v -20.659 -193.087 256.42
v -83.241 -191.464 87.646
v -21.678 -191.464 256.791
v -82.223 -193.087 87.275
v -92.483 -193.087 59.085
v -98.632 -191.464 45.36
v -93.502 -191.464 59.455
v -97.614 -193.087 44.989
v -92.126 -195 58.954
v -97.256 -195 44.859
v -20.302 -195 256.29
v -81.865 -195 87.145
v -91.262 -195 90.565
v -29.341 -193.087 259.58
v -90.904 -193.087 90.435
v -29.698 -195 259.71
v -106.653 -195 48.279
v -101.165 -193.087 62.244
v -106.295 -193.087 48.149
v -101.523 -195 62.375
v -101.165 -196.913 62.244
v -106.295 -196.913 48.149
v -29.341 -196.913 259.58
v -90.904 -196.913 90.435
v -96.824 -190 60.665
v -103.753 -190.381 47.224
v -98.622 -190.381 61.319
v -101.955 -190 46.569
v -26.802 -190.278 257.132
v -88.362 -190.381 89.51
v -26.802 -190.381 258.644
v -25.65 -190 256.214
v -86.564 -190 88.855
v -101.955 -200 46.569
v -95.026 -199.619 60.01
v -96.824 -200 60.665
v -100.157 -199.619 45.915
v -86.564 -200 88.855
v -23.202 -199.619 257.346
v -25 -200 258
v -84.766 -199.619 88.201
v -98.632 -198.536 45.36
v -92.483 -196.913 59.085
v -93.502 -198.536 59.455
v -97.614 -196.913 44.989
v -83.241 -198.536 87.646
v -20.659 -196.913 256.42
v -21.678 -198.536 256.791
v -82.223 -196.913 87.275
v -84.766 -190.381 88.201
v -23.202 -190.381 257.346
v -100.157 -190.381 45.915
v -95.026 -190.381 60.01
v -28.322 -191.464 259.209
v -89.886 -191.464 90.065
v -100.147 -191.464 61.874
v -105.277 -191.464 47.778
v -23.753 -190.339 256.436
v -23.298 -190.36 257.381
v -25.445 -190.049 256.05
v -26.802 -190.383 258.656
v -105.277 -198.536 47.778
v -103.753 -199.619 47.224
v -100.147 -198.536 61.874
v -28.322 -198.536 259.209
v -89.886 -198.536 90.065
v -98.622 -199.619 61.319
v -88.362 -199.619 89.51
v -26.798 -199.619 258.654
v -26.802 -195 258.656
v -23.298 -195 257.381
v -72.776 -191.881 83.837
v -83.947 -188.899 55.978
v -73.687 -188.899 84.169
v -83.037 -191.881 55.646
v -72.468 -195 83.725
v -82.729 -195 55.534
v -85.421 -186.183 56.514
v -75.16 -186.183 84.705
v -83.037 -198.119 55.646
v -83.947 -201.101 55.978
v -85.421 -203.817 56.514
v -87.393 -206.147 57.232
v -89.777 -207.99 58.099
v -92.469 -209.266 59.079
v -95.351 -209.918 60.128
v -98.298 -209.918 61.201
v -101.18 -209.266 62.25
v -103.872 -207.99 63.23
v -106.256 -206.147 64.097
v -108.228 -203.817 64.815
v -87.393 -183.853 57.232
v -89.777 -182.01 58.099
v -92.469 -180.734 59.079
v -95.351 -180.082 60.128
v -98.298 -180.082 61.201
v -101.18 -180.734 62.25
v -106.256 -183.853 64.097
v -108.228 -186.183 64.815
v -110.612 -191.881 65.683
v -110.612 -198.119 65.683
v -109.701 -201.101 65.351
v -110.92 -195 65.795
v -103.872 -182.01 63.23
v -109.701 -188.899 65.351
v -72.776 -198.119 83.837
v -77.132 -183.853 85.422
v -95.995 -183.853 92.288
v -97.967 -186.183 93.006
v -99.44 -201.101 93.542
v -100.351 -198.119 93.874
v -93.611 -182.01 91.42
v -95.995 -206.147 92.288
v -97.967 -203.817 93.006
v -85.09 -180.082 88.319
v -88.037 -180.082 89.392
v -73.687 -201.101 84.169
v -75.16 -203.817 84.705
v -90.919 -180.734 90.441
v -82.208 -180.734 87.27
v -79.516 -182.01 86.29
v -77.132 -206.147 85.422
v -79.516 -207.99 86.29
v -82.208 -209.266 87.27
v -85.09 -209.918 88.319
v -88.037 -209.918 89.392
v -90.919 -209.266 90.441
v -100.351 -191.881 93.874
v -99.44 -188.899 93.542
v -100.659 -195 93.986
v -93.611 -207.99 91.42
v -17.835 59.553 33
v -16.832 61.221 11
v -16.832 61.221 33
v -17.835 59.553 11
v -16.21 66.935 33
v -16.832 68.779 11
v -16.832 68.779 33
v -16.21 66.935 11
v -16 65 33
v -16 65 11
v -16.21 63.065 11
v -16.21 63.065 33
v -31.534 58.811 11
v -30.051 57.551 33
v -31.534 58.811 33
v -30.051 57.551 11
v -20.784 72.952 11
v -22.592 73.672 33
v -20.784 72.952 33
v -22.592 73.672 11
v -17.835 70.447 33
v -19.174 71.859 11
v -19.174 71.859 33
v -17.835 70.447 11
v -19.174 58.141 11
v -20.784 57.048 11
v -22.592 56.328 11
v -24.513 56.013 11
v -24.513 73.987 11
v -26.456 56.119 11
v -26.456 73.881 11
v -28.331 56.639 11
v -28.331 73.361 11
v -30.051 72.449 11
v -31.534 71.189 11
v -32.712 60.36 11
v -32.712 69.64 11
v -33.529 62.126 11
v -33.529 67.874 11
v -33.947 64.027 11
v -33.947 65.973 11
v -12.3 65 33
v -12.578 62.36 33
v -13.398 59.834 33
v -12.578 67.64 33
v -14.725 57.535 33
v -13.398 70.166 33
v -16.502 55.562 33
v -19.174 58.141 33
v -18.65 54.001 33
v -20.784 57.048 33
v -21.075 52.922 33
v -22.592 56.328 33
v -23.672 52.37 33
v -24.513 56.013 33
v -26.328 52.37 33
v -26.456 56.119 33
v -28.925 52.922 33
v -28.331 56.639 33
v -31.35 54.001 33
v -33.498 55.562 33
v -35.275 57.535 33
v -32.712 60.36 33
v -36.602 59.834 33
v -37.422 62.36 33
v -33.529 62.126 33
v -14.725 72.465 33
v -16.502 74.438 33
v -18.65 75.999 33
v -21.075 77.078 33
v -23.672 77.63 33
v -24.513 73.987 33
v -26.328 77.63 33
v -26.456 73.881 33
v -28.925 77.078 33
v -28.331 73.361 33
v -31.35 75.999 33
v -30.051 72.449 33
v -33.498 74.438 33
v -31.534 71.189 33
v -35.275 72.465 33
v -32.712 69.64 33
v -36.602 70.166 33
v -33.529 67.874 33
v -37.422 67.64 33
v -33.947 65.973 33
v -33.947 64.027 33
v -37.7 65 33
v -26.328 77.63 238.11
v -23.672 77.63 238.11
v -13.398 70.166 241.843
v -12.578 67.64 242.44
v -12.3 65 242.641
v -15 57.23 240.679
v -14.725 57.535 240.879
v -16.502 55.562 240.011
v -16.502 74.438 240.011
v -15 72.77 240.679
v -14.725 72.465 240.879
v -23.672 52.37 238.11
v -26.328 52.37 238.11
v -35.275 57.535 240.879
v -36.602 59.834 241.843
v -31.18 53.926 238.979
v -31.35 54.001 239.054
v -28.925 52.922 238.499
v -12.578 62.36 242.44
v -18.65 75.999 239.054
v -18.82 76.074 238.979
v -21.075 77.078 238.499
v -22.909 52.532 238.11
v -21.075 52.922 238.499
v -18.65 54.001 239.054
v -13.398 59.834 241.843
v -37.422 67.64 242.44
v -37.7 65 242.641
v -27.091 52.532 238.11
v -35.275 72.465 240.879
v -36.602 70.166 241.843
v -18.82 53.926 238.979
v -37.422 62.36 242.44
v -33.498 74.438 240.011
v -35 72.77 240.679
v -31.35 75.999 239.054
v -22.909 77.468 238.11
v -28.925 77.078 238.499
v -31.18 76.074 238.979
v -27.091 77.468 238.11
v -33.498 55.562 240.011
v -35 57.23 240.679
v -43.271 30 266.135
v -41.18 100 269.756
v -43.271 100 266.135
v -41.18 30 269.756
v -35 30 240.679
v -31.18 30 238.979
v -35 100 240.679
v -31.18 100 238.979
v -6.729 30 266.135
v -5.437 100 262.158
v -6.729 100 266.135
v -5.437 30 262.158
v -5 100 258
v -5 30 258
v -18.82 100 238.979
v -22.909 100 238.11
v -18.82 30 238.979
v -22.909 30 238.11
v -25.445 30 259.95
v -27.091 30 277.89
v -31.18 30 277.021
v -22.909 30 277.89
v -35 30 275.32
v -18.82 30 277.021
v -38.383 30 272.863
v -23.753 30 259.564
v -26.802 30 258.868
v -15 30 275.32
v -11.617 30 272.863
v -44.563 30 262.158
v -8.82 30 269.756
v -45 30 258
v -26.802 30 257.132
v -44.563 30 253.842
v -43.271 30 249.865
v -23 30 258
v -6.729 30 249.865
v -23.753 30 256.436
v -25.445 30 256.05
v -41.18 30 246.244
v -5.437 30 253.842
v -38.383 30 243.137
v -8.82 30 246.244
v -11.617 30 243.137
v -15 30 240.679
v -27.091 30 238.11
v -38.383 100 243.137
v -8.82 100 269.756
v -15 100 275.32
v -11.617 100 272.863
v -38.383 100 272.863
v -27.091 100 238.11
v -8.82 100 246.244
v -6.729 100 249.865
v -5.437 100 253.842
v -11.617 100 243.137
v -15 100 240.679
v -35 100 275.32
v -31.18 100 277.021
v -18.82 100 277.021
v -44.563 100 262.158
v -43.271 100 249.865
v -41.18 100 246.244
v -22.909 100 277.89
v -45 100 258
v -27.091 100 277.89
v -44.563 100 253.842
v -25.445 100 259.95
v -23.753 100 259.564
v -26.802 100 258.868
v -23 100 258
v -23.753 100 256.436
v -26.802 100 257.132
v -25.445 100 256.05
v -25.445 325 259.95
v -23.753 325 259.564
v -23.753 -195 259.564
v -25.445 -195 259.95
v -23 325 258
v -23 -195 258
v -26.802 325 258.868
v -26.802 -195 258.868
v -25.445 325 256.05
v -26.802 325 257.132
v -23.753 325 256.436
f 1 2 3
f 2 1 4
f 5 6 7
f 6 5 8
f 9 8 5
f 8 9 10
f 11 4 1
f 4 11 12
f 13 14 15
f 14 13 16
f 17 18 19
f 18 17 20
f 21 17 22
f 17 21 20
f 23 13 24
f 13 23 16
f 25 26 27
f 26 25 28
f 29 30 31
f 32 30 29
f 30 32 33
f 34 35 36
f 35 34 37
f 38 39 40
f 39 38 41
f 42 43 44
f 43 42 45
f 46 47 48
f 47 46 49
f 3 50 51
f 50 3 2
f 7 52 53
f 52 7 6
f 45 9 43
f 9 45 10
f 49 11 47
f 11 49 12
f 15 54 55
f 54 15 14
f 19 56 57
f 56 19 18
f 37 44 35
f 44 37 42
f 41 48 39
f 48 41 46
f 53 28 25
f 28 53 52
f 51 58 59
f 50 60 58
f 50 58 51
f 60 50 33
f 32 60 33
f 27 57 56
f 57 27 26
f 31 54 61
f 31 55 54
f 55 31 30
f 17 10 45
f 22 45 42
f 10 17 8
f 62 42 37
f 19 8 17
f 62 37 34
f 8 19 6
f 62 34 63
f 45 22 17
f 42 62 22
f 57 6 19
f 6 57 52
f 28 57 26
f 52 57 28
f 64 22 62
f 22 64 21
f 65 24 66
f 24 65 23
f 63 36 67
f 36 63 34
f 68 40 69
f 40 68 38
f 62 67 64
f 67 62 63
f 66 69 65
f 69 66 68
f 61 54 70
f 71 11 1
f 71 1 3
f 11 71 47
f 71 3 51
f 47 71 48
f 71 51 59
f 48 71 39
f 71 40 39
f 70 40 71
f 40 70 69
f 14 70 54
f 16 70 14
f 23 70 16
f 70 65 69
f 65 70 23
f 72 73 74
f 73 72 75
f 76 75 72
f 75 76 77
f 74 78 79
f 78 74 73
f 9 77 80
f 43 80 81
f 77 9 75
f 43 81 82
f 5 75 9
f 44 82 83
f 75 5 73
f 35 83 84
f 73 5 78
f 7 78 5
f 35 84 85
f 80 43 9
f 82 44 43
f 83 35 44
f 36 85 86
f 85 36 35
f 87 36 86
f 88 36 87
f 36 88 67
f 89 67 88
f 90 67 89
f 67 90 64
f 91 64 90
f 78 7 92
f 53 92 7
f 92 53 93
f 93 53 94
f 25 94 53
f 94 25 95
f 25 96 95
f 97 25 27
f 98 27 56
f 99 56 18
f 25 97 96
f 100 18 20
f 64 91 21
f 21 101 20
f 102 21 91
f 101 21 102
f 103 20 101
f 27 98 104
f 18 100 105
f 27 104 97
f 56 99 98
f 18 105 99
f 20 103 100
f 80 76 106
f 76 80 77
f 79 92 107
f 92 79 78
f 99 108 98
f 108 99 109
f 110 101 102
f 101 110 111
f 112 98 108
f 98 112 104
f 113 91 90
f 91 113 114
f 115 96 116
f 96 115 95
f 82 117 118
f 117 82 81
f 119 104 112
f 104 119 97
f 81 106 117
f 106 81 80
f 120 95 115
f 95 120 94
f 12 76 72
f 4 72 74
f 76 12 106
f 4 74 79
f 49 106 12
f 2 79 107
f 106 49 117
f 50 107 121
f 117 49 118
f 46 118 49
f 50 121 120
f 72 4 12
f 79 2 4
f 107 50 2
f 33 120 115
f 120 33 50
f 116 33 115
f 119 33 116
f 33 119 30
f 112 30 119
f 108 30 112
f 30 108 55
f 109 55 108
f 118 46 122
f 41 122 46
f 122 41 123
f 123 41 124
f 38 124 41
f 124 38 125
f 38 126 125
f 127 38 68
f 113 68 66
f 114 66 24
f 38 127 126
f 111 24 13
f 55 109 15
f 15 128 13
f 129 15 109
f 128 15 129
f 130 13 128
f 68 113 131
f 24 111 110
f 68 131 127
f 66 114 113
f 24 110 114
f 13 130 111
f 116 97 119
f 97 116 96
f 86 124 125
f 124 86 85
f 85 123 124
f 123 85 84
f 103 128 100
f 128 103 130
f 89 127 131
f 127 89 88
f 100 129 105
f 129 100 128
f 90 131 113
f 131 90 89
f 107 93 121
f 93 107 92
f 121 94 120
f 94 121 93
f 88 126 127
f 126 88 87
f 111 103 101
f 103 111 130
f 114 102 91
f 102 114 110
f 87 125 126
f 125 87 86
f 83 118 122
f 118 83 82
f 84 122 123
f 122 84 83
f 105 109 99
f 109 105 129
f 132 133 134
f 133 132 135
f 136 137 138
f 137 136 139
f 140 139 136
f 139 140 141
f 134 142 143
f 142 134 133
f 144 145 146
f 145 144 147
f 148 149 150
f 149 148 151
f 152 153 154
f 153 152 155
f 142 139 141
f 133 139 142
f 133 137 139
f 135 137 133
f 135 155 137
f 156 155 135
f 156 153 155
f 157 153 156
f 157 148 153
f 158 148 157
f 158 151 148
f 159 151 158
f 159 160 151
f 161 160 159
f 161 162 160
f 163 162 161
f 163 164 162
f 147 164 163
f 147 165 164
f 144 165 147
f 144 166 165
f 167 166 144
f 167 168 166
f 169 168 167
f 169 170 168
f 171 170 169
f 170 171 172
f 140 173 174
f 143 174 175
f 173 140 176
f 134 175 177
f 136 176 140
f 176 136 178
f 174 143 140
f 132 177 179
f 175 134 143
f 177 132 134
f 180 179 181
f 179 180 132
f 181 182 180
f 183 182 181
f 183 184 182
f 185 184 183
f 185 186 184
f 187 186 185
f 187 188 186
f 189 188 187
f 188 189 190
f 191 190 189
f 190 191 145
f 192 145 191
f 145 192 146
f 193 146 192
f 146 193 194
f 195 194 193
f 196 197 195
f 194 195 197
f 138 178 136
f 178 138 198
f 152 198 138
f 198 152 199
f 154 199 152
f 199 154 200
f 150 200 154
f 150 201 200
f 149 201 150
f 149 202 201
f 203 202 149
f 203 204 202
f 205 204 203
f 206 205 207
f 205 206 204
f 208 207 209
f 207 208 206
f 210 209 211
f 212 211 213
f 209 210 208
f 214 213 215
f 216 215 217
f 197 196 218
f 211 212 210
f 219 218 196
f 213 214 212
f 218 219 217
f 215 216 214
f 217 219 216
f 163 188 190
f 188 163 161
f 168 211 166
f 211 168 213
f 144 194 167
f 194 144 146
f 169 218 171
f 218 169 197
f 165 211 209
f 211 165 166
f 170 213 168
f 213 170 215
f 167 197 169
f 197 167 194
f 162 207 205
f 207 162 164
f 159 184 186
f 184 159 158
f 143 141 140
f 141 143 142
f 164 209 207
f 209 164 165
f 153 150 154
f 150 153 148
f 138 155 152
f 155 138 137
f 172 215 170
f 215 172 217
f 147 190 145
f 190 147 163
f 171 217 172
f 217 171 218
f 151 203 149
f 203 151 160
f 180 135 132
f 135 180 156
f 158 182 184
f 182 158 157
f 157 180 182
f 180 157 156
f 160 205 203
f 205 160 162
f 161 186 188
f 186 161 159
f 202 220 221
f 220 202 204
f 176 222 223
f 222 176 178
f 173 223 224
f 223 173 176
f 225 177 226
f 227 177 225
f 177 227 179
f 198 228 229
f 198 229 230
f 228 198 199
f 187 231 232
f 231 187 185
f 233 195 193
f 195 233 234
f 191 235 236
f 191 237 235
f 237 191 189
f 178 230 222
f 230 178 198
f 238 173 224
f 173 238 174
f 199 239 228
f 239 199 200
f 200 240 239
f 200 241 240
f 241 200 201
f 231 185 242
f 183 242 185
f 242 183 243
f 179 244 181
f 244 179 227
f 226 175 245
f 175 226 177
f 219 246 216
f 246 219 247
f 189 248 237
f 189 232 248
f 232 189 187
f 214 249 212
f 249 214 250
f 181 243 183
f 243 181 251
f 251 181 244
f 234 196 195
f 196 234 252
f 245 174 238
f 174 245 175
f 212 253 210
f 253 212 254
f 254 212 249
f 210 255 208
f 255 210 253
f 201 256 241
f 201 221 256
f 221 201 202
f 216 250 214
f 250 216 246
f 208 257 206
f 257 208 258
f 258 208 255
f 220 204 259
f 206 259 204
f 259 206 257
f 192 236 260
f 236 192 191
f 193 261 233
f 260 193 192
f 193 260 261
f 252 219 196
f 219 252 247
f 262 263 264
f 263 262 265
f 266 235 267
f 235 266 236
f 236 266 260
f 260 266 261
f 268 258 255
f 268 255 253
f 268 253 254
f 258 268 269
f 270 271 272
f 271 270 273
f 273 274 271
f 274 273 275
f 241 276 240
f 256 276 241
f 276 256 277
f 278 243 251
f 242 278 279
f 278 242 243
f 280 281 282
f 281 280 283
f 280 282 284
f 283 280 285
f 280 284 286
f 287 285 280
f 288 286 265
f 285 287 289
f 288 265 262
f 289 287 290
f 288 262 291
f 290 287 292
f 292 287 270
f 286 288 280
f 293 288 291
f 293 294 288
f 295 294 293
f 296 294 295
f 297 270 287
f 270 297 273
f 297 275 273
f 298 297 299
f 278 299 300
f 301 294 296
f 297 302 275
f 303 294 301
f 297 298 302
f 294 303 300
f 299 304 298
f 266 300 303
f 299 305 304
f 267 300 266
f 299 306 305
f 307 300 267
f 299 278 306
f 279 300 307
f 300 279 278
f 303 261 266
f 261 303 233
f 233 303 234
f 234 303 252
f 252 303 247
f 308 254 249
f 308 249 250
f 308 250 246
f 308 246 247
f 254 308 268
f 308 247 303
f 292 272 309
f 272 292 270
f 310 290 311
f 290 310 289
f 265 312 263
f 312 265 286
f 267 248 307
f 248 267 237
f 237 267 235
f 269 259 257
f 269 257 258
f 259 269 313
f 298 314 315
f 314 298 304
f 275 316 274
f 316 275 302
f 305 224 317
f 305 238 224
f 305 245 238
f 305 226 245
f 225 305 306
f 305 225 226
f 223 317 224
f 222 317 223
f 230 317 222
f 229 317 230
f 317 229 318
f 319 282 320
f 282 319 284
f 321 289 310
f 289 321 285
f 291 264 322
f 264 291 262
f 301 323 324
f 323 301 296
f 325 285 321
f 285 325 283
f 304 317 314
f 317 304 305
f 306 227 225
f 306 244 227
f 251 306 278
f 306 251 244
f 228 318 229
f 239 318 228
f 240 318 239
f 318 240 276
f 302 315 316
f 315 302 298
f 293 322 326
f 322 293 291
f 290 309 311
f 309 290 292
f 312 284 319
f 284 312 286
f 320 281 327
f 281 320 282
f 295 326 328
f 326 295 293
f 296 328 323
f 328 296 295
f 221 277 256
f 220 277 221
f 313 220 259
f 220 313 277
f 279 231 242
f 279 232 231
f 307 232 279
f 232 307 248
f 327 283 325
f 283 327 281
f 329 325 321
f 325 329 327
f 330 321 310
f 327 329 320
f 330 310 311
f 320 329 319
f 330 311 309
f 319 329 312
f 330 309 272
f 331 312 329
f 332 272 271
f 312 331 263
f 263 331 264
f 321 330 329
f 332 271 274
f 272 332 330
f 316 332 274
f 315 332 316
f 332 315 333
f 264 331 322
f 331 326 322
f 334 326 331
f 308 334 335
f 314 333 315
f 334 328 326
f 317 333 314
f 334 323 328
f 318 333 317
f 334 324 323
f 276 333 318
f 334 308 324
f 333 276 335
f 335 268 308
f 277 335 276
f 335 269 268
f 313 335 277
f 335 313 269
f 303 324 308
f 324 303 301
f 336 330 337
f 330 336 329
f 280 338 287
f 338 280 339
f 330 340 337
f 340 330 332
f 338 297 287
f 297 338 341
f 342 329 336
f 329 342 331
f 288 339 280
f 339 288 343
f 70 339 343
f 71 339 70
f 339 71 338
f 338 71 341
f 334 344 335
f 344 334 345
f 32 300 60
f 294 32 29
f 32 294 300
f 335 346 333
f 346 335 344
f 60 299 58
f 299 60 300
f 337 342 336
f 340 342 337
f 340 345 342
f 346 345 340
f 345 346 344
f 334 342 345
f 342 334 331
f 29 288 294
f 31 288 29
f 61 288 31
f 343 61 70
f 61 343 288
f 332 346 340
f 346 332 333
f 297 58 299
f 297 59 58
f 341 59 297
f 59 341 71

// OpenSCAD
color("gray")
translate([-25,65,0])
translate([0,0,22])
cylinder(h=22,r=9,center=true);

origen2=[-25,65,22+11];

color("red")
translate(origen2)
sphere(r = 3);

//-----------------------------origen2:

color("orangered")
translate(origen2)
cylinder(h=225,r=25.4/2,center=false);

color("gray")
translate([0,35,225])
translate(origen2)
rotate([90,0,0])
cylinder(h=70,r=20,center=false);


origen3= origen2+[0,0,225];

color("red")
translate(origen3)
rotate([90,0,0])
cylinder(h=260*2,r=2,center=true);

//********************************
//pendulo:
module pendulo(){
translate([0,0,-225])
cylinder(h=225,r=5,center=false);
translate([0,0,-210])
cylinder(h=30,r=15,center=false);
}





/////////////////////
origen4=origen3+[0,-260,0];
echo("1327origen4 =", origen4);
echo("1327origen(4-3) =", origen4-origen3);
translate(origen4)
rotate([0,20,0])
pendulo();


//origen4 [-25, -195, 258]
//conclusion
//armlength=260
//L_pendulo=225
